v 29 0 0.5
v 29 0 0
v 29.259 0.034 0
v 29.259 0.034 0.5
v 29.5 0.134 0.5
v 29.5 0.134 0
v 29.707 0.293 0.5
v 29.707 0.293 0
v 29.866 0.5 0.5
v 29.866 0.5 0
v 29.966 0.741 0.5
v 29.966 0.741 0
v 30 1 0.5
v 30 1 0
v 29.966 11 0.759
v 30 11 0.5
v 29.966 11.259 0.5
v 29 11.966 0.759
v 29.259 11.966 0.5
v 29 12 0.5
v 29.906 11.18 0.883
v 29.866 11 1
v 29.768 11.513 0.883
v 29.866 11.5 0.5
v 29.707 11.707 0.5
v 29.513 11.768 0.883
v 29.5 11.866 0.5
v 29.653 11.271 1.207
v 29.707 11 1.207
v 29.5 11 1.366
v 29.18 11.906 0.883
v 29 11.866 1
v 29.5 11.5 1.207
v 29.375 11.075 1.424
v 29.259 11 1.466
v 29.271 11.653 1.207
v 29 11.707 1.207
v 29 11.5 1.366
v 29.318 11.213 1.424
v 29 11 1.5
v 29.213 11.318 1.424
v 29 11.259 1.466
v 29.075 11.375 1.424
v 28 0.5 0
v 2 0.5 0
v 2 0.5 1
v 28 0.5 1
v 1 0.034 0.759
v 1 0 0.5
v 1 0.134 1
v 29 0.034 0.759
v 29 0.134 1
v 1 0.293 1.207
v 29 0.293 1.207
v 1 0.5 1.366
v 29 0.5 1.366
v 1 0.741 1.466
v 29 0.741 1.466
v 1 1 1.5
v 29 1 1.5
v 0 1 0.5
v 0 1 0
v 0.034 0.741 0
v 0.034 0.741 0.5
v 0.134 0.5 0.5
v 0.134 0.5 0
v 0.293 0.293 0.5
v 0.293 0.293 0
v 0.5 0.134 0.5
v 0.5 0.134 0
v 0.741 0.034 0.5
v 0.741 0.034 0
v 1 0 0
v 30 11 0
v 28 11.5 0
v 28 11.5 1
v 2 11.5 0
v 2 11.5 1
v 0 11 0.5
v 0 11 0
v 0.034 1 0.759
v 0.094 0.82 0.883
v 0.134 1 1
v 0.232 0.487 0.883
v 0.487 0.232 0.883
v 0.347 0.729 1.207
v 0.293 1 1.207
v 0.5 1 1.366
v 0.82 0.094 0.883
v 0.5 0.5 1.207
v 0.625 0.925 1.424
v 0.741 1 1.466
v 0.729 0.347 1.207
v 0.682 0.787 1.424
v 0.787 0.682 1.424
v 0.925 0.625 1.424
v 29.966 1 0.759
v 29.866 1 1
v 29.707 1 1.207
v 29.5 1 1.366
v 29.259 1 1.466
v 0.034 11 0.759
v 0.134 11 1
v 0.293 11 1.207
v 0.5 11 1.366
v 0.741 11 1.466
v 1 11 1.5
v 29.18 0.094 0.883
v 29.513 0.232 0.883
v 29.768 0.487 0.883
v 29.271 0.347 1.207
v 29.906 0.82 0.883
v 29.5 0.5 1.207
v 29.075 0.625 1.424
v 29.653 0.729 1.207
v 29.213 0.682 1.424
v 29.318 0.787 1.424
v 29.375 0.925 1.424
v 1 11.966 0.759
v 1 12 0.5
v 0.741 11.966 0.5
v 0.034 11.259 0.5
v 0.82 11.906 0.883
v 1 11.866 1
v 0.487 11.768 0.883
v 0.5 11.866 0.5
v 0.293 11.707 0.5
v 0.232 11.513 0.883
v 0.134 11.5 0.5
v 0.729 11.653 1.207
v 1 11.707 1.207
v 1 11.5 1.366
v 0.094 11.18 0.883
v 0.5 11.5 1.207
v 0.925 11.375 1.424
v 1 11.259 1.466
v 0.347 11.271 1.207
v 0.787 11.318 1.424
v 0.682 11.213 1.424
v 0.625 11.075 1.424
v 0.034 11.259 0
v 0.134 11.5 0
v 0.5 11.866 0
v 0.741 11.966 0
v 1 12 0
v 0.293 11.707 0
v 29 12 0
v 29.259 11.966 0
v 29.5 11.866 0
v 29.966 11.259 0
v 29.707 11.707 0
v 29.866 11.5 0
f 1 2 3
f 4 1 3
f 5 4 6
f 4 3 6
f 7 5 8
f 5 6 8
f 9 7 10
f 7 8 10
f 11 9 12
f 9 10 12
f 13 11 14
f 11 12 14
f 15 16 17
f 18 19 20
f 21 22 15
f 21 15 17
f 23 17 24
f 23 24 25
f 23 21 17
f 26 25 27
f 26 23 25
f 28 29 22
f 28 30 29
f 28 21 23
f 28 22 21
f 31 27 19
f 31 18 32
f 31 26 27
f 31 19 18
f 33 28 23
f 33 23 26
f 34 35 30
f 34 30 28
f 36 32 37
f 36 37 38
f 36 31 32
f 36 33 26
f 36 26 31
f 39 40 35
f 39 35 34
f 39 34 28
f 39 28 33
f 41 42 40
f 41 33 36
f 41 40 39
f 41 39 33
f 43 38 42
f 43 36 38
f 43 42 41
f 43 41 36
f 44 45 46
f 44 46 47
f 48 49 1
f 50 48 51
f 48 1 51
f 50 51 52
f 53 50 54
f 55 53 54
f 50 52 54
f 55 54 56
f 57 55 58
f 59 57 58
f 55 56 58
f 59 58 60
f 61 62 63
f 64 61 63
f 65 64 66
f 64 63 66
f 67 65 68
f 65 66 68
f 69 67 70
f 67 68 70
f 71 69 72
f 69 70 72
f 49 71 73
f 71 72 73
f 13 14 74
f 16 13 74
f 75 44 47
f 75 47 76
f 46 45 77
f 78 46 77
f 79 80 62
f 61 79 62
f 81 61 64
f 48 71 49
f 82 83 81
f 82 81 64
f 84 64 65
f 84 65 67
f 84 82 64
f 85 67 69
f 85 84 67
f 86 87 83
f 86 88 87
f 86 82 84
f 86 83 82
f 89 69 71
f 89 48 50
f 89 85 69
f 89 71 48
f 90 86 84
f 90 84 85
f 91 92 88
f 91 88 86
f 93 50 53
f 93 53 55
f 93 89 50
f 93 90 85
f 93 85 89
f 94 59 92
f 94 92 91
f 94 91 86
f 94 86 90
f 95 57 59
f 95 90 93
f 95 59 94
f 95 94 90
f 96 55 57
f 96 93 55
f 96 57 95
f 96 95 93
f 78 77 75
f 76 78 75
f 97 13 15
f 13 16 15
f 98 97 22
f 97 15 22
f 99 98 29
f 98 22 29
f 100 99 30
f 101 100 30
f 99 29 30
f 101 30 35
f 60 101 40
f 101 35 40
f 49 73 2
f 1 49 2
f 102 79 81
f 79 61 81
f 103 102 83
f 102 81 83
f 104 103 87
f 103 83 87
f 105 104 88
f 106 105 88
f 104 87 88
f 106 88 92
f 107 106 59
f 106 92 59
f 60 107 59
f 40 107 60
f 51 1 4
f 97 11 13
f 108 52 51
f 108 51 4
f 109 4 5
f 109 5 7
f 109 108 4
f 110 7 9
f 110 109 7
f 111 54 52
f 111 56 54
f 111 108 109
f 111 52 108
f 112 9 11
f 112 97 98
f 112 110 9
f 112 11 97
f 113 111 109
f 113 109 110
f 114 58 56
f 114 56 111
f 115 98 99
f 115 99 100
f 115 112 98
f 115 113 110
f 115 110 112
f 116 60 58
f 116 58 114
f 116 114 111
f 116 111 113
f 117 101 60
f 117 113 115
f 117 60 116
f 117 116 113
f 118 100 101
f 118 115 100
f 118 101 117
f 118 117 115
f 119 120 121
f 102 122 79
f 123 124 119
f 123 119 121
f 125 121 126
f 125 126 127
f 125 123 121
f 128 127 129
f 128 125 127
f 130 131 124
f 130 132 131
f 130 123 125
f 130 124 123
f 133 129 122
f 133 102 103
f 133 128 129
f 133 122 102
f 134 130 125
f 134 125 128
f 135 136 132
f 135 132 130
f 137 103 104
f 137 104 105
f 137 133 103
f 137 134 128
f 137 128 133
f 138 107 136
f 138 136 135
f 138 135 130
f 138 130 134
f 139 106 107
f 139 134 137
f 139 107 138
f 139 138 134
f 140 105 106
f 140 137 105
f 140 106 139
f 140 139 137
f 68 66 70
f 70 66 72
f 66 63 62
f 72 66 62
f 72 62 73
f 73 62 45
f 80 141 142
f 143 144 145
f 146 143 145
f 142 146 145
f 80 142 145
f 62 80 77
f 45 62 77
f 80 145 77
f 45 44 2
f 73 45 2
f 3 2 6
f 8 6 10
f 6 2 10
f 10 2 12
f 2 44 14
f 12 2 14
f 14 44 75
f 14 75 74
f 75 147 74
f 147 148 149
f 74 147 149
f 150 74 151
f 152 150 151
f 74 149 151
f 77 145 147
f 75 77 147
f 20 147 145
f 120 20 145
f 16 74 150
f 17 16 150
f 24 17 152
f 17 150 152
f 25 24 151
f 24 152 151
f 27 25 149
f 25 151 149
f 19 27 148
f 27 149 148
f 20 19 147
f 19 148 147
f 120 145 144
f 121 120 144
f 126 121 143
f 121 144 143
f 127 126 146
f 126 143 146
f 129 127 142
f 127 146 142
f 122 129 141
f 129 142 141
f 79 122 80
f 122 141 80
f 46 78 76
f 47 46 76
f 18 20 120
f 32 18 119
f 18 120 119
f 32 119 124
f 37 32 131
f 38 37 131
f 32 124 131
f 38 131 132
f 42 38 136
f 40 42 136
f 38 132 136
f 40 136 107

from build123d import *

# Parameters (mm, degrees)
F1_DEPTH = 1.5
F2_R     = 1
F3_W     = 26
F3_H     = 11
F4_DEPTH = 1


with BuildPart() as f1:
    # F0 (on Top) → F1 (new body)
    with BuildSketch(Plane.XY):
        with BuildLine():
            ThreePointArc((0, 1), (0.2928932188, 0.2928932188), (1, 0))
            Line((1, 0), (29, 0))
            ThreePointArc((29, 0), (29.7071067812, 0.2928932188), (30, 1))
            Line((30, 1), (30, 11))
            ThreePointArc((30, 11), (29.7071067812, 11.7071067812), (29, 12))
            Line((29, 12), (1, 12))
            ThreePointArc((1, 12), (0.2928932188, 11.7071067812), (0, 11))
            Line((0, 11), (0, 1))
        make_face()
    extrude(amount=F1_DEPTH)

    # F2
    f2_edges = [f1.edges().sort_by_distance(p)[0] for p in [
        (0, 6, 1.5),
        (0.292893, 0.292893, 1.5),
        (15, 0, 1.5),
        (29.707107, 0.292893, 1.5),
        (30, 6, 1.5),
        (29.707107, 11.707107, 1.5),
        (15, 12, 1.5),
        (0.292893, 11.707107, 1.5),
    ]]
    fillet(f2_edges, radius=F2_R)

    # F3 (on Top) → F4 (cut)
    with BuildSketch(Plane.XY):
        with Locations((15, 6)):
            Rectangle(F3_W, F3_H)
    extrude(amount=F4_DEPTH, mode=Mode.SUBTRACT)


solid = f1.part
